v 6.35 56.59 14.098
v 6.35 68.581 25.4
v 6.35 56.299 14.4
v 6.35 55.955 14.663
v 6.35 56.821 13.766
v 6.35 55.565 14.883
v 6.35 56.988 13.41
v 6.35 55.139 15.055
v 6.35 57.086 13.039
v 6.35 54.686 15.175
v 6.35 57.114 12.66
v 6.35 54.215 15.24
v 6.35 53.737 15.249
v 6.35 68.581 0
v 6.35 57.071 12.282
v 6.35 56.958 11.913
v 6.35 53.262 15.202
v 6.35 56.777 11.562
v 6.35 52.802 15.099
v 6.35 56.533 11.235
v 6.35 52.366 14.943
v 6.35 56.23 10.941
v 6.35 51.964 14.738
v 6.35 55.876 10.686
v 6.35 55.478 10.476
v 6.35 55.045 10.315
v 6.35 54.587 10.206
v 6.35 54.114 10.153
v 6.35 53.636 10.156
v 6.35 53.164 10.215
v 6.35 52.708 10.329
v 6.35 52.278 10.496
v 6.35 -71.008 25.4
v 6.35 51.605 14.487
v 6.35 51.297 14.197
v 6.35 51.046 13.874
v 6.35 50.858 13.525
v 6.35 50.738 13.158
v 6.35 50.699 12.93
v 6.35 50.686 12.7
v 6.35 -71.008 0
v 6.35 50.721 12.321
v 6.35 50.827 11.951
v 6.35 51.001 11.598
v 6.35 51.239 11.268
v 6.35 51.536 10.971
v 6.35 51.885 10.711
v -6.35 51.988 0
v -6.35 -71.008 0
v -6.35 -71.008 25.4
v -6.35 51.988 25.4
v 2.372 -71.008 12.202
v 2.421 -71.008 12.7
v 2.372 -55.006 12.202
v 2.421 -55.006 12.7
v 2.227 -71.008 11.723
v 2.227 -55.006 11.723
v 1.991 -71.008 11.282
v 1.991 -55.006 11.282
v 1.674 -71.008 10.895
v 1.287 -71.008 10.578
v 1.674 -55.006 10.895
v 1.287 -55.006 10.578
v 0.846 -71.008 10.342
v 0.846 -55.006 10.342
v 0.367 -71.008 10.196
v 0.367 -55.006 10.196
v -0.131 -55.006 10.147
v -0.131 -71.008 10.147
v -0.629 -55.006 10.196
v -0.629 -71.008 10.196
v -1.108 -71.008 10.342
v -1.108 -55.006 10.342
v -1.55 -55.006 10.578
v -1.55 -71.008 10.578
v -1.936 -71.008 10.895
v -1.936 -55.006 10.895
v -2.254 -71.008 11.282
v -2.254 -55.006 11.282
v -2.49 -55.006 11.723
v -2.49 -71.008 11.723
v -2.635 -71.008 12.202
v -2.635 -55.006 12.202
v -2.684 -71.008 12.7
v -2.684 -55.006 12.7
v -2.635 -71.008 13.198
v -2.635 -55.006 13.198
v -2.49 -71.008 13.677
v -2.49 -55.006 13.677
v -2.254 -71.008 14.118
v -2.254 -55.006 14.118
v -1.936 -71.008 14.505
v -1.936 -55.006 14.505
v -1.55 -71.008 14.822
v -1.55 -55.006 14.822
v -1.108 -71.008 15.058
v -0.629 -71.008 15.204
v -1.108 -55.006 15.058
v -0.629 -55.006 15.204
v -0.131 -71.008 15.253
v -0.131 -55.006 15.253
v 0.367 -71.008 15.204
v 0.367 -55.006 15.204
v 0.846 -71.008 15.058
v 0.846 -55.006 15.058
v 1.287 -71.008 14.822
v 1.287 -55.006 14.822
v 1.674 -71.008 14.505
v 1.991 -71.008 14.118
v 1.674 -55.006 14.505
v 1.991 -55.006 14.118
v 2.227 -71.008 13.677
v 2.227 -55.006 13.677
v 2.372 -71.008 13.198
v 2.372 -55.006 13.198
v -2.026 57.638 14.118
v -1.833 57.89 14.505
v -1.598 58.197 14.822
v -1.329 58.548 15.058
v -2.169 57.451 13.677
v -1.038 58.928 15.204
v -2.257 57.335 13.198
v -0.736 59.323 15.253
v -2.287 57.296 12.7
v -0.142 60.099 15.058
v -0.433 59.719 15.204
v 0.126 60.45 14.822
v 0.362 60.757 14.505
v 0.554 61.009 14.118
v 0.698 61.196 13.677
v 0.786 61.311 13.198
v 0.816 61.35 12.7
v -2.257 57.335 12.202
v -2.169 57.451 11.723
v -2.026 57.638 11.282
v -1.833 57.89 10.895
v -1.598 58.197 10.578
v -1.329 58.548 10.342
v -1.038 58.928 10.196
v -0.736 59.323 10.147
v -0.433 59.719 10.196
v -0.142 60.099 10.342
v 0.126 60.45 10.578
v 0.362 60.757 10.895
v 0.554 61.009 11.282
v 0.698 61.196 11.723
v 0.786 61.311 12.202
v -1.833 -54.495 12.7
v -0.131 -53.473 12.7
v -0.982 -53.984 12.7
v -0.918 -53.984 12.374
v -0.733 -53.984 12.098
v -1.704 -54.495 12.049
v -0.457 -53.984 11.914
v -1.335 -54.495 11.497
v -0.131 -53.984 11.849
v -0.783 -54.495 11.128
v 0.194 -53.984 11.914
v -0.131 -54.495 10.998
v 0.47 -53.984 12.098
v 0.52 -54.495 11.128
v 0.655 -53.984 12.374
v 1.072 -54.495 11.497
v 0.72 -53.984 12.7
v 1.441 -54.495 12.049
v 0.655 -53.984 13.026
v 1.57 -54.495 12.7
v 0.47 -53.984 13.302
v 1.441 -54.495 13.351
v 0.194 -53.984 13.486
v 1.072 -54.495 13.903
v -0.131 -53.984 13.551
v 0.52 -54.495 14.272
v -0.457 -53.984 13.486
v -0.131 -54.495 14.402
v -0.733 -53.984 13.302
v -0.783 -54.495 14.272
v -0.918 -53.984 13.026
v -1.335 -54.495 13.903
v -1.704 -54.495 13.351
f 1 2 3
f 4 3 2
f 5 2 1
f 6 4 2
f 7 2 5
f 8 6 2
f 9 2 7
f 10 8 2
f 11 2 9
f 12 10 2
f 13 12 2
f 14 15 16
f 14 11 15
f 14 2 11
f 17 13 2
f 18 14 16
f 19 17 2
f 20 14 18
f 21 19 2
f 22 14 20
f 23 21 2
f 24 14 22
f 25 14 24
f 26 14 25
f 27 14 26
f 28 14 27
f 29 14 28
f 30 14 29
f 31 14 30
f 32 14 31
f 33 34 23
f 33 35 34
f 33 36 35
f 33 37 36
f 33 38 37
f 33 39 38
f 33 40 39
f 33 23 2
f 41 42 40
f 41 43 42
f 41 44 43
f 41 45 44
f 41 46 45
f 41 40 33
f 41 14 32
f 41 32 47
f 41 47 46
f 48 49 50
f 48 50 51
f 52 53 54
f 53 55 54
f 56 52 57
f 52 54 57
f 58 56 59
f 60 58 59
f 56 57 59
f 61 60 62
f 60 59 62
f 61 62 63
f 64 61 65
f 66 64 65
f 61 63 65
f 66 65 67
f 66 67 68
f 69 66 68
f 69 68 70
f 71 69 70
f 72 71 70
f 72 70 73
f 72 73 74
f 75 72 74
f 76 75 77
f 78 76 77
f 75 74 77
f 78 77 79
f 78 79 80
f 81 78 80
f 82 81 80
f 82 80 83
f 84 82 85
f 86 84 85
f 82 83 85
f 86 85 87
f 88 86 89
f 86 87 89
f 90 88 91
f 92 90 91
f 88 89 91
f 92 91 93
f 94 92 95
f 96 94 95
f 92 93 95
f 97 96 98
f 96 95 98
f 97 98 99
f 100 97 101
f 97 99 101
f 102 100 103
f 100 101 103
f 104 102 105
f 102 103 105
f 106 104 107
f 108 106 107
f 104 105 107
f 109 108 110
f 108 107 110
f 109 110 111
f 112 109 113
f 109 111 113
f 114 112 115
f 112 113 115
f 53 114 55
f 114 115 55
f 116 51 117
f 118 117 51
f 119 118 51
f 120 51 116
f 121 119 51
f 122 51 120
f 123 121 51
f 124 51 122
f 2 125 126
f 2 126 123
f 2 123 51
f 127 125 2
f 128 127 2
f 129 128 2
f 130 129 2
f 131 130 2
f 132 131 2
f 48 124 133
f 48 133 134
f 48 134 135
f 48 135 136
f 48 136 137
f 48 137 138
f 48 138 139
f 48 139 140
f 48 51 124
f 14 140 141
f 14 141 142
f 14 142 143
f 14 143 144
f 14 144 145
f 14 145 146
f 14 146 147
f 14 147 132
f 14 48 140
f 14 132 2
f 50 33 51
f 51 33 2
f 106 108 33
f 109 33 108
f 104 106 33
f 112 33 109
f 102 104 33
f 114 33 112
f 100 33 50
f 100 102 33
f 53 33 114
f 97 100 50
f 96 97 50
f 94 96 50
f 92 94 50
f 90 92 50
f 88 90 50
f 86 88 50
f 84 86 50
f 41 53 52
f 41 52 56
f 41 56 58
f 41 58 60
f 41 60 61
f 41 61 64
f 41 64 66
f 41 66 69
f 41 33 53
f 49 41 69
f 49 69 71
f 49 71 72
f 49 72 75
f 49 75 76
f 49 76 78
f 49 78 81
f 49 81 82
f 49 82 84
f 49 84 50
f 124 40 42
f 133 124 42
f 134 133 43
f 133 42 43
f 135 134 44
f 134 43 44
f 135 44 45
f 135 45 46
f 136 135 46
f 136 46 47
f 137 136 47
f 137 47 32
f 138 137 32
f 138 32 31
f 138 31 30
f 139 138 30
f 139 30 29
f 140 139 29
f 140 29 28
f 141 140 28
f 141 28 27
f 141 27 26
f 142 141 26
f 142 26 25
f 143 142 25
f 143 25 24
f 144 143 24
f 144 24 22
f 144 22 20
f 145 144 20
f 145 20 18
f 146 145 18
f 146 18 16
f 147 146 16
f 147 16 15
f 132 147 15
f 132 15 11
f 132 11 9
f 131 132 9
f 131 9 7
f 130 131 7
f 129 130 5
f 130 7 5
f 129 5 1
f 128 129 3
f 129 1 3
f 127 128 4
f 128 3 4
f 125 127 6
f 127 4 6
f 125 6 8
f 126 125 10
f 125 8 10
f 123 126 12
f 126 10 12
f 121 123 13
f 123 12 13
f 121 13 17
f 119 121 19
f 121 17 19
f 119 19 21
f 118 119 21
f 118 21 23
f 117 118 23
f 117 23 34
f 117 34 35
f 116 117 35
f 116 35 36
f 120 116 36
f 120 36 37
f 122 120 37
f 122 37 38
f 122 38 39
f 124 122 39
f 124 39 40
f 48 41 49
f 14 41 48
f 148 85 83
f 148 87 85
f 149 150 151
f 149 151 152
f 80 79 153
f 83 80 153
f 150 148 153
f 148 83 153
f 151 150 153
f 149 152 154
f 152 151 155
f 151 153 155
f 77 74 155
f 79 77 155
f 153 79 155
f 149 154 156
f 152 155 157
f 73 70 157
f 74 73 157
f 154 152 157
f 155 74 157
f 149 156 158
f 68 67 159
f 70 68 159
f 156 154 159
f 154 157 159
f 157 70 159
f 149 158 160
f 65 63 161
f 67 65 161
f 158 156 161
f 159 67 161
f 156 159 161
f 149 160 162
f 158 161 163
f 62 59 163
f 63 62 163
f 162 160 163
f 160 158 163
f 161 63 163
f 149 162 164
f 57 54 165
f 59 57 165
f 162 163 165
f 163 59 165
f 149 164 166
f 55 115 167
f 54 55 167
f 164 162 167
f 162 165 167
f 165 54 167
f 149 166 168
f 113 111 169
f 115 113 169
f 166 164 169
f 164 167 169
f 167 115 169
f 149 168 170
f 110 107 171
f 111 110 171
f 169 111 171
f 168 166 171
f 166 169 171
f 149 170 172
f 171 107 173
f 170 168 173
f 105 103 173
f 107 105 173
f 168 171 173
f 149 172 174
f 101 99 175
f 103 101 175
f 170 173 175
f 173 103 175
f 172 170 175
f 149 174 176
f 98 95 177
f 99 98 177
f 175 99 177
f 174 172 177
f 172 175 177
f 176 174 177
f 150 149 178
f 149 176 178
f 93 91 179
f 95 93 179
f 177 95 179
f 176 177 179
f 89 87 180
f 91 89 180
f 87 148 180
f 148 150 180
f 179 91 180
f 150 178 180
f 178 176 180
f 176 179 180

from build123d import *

# Parameters (mm, degrees)
EXTRUDE1_DEPTH              = 25.4
F_1_4_20_TAPPED_HOLE1_D     = 5.1054
F_1_4_20_TAPPED_HOLE1_DEPTH = 16.002
F_1_4_20_TAPPED_HOLE1_TIP   = 1.533816902
F_1_4_20_TAPPED_HOLE2_D     = 5.1054
F_1_4_20_TAPPED_HOLE2_DEPTH = 16.002
F_1_4_20_TAPPED_HOLE2_TIP   = 1.533816902


with BuildPart() as part:
    # Sketch1 → Extrude1 (new body)
    with BuildSketch(Plane.XY):
        Polygon((-6.35, 51.987941466), (6.35, 68.580838747), (6.35, -71.008376889), (-6.35, -71.008376889), align=None)
    extrude(amount=EXTRUDE1_DEPTH)

    # 1/4-20 Tapped Hole1
    with Locations(Plane(origin=(-36.866449815, 12.117365312, 18.061260674), x_dir=(0.6077917109691768, 0.7940964904072809, 0), z_dir=(-0.7940964904072809, 0.6077917109691768, 0))):
        with Locations((59.446155795, 5.361260674)):
            Hole(F_1_4_20_TAPPED_HOLE1_D / 2, depth=F_1_4_20_TAPPED_HOLE1_DEPTH)
            with Locations((0, 0, -(F_1_4_20_TAPPED_HOLE1_DEPTH + F_1_4_20_TAPPED_HOLE1_TIP / 2))):  # 118° drill point
                Cone(0, F_1_4_20_TAPPED_HOLE1_D / 2, F_1_4_20_TAPPED_HOLE1_TIP, mode=Mode.SUBTRACT)

    # 1/4-20 Tapped Hole2
    with Locations(Plane(origin=(-43.242259668, -71.008376889, 18.061260674), x_dir=(-1, 0, 0), z_dir=(0, -1, 0))):
        with Locations((-43.110887349, 5.361260674)):
            Hole(F_1_4_20_TAPPED_HOLE2_D / 2, depth=F_1_4_20_TAPPED_HOLE2_DEPTH)
            with Locations((0, 0, -(F_1_4_20_TAPPED_HOLE2_DEPTH + F_1_4_20_TAPPED_HOLE2_TIP / 2))):  # 118° drill point
                Cone(0, F_1_4_20_TAPPED_HOLE2_D / 2, F_1_4_20_TAPPED_HOLE2_TIP, mode=Mode.SUBTRACT)


solid = part.part
